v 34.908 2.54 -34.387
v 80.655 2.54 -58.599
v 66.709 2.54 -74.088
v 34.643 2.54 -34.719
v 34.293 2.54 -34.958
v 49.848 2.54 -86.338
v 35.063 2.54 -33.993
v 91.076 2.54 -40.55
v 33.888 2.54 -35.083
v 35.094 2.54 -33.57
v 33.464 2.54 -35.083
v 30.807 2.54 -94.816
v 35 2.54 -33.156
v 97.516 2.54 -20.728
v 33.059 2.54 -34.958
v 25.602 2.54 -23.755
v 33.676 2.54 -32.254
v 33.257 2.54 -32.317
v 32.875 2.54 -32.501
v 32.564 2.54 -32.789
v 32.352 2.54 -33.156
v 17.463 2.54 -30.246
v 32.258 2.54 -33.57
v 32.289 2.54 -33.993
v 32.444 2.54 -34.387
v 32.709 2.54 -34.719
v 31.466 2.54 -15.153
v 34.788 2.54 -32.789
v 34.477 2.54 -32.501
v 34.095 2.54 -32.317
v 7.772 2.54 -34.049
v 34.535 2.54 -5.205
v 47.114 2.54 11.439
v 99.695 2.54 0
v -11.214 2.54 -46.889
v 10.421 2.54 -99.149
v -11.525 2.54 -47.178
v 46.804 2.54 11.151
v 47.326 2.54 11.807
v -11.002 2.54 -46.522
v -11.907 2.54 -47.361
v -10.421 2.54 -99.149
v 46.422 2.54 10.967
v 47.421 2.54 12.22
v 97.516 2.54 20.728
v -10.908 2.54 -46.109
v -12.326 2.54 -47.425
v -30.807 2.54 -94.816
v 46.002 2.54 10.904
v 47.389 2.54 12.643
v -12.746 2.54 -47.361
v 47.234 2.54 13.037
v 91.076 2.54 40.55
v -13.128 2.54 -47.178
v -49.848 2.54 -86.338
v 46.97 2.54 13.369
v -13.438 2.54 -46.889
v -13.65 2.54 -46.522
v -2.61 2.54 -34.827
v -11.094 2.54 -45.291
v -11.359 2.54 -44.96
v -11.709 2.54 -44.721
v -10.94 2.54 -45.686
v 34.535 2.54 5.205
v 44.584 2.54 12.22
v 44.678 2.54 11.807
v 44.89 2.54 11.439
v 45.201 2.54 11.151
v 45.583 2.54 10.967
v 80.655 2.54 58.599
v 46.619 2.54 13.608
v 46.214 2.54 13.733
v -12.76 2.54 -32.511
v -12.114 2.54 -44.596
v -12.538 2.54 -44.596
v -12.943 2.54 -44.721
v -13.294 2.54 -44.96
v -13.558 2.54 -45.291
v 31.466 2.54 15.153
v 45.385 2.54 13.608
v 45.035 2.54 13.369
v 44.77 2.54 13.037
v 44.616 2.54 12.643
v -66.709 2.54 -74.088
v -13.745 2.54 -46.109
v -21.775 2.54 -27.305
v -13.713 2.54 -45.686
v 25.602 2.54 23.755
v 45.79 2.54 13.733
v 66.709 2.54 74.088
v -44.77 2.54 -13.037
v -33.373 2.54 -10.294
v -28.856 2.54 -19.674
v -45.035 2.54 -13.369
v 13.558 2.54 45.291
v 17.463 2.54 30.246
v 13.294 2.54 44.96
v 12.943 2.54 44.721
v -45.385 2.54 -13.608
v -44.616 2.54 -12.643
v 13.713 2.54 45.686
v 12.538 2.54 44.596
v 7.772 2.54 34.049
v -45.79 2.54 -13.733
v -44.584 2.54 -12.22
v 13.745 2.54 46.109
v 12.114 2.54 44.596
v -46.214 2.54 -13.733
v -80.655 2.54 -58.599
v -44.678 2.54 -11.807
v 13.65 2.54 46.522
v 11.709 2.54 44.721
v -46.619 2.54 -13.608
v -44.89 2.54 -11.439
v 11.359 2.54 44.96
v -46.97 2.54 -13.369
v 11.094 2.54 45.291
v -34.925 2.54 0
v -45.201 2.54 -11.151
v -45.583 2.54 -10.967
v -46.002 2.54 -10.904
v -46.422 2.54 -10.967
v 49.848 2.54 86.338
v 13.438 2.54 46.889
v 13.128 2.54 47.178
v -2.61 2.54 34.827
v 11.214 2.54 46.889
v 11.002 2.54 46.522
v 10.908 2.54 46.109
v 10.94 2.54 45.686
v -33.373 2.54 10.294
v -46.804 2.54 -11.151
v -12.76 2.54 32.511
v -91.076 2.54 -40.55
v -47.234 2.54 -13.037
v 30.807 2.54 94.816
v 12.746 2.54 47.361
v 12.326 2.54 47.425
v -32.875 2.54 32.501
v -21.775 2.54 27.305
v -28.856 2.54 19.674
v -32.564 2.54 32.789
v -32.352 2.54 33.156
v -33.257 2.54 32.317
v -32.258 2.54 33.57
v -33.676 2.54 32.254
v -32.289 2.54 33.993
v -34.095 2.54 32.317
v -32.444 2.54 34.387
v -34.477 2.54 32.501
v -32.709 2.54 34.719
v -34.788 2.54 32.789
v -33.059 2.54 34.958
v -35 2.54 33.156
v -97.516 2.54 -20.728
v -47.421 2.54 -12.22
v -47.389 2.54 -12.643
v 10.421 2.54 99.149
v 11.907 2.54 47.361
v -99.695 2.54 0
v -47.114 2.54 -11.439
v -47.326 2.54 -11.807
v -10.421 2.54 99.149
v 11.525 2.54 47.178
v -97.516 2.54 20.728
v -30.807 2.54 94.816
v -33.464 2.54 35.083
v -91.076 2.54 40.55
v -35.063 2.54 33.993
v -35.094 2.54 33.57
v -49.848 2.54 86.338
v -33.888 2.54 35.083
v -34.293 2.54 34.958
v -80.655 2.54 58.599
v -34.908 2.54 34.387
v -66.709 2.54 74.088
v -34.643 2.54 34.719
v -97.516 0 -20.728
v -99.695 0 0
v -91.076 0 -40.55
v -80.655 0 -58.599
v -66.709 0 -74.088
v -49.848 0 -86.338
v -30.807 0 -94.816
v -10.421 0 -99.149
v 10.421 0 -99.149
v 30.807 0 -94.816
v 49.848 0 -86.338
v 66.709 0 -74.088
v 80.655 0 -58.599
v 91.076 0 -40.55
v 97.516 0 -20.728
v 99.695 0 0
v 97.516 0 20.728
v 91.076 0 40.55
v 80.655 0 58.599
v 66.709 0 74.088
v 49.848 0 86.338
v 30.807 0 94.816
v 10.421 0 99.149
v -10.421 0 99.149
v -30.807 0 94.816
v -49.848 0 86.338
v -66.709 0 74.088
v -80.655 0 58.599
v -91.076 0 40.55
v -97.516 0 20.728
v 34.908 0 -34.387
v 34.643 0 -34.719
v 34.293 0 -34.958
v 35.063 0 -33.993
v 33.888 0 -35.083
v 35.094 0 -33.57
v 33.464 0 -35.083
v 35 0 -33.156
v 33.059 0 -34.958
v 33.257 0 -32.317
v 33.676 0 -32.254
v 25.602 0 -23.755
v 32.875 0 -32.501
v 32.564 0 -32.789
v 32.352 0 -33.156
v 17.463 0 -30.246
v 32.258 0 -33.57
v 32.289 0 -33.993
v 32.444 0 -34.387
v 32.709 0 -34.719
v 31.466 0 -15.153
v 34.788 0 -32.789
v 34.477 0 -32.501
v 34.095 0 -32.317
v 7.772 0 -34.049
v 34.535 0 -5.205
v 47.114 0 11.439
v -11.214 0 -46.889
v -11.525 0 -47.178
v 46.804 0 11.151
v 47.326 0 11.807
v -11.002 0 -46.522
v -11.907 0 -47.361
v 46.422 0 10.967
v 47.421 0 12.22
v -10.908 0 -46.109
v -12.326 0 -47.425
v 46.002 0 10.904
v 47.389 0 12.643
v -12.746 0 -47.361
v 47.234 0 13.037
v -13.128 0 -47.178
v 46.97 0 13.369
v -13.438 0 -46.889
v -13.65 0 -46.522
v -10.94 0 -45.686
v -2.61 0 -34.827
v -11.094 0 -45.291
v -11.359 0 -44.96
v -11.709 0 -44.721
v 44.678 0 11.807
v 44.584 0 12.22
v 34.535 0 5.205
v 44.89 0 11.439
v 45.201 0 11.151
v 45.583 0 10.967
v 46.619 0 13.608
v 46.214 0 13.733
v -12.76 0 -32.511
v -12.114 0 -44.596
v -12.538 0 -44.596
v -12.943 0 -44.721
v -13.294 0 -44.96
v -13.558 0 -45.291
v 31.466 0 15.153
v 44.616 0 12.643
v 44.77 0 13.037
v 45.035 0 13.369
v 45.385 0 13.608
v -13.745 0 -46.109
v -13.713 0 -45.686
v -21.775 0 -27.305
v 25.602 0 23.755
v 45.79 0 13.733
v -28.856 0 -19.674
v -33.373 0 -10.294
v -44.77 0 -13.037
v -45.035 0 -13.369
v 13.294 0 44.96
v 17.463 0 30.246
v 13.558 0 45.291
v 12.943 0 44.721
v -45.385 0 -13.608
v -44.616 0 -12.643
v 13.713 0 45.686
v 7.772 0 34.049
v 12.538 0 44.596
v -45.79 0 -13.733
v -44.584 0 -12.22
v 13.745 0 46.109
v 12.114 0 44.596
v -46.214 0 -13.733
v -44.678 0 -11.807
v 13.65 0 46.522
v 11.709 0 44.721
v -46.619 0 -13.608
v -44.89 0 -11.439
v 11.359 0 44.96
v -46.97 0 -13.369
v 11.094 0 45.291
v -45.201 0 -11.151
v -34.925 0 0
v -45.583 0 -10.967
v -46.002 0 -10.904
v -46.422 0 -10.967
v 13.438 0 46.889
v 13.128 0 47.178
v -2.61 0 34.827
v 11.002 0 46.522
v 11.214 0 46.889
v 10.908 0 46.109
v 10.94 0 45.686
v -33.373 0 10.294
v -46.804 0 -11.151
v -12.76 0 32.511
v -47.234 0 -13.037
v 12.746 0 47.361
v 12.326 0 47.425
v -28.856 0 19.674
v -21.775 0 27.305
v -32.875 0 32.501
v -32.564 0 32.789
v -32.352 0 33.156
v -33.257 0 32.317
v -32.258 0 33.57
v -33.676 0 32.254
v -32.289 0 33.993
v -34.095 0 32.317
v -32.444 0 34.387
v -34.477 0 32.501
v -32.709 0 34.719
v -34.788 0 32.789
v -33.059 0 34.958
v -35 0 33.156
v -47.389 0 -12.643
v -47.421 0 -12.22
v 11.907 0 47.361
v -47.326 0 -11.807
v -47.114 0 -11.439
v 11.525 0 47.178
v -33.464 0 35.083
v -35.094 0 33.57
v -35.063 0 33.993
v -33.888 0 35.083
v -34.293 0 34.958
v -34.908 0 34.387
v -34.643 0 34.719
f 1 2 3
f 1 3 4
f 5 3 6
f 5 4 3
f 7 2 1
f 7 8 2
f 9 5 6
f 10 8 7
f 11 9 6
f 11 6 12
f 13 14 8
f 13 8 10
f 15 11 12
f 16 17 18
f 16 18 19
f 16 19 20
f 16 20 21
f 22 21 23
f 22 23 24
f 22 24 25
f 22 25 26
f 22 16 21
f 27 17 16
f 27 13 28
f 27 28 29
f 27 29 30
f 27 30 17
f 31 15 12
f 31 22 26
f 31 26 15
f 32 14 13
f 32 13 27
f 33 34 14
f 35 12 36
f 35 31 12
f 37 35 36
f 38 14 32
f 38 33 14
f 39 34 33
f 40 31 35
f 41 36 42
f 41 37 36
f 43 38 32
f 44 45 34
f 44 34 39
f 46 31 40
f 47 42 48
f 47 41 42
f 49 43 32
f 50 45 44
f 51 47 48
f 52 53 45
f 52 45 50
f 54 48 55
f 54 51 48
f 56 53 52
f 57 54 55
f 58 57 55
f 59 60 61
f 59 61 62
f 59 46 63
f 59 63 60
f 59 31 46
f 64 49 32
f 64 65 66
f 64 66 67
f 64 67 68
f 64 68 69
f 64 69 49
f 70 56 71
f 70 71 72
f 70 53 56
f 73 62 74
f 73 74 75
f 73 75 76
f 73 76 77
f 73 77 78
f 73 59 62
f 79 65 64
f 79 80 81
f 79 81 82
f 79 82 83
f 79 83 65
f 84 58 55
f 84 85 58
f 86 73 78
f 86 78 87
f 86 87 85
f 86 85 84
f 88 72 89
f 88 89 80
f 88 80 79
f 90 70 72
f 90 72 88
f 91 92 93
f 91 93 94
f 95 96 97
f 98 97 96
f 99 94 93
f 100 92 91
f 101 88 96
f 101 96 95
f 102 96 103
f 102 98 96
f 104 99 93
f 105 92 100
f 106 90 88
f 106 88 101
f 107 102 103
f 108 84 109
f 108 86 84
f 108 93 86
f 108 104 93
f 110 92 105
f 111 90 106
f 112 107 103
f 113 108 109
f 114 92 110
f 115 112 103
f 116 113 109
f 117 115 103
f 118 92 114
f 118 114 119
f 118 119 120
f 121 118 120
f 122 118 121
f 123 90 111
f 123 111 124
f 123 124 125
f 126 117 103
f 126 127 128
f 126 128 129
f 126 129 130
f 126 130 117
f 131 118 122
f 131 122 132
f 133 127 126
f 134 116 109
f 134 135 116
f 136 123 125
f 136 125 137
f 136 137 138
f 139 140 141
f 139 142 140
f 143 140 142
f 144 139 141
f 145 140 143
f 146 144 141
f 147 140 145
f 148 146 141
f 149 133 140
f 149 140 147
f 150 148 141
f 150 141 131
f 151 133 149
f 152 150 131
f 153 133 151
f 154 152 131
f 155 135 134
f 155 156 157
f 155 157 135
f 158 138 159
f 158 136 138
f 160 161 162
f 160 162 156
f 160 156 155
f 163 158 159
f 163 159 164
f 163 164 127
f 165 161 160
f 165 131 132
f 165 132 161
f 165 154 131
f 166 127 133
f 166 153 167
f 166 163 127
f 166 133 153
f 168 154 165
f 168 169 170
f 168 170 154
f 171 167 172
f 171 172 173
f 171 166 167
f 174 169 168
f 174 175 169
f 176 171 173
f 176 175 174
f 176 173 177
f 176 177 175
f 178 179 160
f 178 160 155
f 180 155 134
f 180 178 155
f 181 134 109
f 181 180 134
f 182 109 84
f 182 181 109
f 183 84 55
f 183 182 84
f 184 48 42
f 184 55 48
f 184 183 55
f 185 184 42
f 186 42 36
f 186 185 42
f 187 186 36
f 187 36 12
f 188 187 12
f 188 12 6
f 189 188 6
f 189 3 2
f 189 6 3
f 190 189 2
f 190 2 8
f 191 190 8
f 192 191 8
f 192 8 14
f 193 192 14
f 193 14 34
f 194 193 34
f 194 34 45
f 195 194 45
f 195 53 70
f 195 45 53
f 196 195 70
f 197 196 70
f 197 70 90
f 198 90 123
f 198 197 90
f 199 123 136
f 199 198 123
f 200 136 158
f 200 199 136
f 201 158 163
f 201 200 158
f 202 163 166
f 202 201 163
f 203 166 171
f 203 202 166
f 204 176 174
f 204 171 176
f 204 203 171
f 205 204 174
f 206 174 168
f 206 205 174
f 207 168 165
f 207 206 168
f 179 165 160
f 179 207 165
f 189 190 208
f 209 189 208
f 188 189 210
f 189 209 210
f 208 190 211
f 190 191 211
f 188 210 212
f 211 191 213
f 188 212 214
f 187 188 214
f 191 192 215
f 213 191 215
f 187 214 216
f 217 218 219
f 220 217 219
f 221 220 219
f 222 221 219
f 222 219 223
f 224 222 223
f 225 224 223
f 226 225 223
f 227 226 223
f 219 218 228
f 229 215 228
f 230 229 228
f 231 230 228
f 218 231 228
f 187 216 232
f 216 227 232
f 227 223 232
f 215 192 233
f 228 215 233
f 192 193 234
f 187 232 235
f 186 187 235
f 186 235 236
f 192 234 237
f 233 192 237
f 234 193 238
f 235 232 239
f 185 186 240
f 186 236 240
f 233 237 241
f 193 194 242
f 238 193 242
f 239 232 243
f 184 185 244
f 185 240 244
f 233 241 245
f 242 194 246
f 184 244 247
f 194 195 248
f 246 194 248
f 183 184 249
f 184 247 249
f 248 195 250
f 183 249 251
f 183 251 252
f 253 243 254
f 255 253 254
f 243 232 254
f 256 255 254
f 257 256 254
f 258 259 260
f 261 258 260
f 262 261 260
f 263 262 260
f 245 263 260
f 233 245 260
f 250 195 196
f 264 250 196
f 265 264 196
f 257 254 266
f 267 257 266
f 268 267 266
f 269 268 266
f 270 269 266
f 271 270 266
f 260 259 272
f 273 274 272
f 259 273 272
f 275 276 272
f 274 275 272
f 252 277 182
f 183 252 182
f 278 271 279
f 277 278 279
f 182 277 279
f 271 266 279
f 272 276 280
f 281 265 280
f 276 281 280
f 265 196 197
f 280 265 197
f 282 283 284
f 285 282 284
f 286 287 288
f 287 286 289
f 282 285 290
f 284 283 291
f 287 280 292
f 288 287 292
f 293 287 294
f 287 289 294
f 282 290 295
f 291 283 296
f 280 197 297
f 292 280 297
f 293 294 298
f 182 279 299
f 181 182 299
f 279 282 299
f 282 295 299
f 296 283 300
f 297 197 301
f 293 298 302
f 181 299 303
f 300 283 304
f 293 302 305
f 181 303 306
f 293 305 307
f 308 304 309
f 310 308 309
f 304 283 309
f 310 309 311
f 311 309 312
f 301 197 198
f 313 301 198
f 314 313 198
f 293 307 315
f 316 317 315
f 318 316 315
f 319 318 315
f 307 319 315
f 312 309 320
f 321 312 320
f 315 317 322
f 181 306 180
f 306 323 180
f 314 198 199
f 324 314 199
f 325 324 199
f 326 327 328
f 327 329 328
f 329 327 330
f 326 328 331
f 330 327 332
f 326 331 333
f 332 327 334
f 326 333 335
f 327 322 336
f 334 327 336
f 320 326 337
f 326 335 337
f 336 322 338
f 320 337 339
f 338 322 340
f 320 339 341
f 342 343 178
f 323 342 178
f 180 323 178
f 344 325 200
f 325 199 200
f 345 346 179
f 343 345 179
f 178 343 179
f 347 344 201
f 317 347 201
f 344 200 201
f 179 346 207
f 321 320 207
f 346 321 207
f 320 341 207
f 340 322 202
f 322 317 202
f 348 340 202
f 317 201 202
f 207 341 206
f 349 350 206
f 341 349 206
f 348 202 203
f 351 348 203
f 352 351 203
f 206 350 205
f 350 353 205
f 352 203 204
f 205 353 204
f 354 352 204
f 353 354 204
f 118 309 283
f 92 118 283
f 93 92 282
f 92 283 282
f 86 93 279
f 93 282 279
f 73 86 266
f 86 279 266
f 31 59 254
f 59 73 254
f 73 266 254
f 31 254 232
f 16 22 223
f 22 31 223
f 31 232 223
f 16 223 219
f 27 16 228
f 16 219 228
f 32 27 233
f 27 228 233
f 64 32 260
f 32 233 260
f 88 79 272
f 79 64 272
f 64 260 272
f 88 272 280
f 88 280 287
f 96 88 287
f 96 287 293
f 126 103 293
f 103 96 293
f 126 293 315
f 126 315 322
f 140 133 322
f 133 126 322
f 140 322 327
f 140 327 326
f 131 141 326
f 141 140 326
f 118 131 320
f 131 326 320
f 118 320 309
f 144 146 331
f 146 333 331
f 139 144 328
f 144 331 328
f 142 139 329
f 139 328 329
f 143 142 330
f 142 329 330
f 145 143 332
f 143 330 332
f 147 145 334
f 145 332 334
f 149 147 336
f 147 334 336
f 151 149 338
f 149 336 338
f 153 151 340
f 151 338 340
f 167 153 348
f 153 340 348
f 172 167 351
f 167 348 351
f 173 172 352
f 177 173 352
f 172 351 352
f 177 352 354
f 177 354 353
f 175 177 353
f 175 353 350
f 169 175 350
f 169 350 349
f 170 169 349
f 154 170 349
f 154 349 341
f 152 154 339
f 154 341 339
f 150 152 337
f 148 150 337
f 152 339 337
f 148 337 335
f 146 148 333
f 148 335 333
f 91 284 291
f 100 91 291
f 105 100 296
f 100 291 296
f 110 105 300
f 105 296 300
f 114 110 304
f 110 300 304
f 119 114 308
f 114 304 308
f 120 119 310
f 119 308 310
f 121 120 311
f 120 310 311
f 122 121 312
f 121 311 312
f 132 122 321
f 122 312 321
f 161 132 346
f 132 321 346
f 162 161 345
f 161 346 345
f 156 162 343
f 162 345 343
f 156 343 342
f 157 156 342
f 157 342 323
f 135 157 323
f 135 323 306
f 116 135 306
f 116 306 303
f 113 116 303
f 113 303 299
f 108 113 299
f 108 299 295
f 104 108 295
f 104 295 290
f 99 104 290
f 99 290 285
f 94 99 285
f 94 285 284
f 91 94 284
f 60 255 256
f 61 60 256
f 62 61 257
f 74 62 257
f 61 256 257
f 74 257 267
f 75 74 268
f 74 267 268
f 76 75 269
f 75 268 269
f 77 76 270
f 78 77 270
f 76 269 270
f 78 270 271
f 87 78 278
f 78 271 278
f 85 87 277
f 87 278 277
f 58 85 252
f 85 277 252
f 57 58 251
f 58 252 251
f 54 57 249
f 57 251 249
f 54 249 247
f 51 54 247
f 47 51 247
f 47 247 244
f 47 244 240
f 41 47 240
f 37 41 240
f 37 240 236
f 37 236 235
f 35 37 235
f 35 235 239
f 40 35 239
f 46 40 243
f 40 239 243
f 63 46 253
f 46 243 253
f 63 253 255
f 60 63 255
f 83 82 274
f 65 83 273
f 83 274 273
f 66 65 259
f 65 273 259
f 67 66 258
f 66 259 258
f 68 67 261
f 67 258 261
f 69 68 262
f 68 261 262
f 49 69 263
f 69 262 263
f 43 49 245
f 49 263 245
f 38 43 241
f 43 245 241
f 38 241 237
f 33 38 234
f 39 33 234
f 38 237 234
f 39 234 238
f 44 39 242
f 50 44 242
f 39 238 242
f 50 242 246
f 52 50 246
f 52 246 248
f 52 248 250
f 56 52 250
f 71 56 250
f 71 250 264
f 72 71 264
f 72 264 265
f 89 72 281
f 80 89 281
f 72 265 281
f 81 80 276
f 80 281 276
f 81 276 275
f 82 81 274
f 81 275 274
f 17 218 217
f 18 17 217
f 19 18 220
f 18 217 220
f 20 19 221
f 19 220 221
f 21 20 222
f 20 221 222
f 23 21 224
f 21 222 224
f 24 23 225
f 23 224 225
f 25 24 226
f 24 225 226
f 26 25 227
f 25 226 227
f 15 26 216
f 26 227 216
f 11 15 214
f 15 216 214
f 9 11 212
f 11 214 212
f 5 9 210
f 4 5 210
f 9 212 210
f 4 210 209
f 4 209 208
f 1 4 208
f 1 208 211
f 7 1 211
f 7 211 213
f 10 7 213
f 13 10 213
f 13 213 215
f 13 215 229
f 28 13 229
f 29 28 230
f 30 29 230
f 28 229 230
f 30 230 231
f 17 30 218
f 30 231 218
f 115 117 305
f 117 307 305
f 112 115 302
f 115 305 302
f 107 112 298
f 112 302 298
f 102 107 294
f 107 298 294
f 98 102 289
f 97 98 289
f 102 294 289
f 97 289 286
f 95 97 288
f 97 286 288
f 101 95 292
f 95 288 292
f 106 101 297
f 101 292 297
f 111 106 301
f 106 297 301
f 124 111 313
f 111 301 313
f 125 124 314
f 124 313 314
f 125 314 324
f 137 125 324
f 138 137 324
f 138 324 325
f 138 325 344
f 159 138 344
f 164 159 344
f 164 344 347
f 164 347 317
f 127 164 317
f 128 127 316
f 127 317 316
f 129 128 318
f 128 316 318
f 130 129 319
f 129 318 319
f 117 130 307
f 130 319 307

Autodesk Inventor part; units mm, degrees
ref_plane "YZ Plane" through (0, 0, 0) normal (1, 0, 0) x (0, 1, 0)
ref_plane "XZ Plane" through (0, 0, 0) normal (0, 1, 0) x (-1, 0, 0)
ref_plane "XY Plane" through (0, 0, 0) normal (0, 0, 1) x (1, 0, 0)
sketch "Sketch1" plane through (0, 0, 0) normal (0, 1, 0) x (-1, 0, 0)
  circle A0 centre (0, 0) radius 99.695
  circle A1 centre (0, 0) radius 34.925
  dimension "d0" = 199.39
  dimension "d16" = 69.85
extrude "Extrusion1" add sketch "Sketch1" along normal blind 2.54
sketch "Sketch2" plane through (0, 2.54, 0) normal (0, 1, 0) x (1, 0, 0)
  line L0 (0, 0) -> (33.676, 33.676) construction
  line L1 (0, 0) -> (47.625, 0) construction
  dimension "d4" = 47.625
  dimension "d5" = 45
hole "Hole1" at (33.676, 2.54, -33.676) direction (0, -1, 0) diameter 2.8448 end through all
pattern_circular "Circular Pattern1" count 6 over 360 about axis through (0, 0, 0) along (0, 1, 0) of "Hole1"
properties part number "4K shield bottom" material "Brass, Soft Yellow"
